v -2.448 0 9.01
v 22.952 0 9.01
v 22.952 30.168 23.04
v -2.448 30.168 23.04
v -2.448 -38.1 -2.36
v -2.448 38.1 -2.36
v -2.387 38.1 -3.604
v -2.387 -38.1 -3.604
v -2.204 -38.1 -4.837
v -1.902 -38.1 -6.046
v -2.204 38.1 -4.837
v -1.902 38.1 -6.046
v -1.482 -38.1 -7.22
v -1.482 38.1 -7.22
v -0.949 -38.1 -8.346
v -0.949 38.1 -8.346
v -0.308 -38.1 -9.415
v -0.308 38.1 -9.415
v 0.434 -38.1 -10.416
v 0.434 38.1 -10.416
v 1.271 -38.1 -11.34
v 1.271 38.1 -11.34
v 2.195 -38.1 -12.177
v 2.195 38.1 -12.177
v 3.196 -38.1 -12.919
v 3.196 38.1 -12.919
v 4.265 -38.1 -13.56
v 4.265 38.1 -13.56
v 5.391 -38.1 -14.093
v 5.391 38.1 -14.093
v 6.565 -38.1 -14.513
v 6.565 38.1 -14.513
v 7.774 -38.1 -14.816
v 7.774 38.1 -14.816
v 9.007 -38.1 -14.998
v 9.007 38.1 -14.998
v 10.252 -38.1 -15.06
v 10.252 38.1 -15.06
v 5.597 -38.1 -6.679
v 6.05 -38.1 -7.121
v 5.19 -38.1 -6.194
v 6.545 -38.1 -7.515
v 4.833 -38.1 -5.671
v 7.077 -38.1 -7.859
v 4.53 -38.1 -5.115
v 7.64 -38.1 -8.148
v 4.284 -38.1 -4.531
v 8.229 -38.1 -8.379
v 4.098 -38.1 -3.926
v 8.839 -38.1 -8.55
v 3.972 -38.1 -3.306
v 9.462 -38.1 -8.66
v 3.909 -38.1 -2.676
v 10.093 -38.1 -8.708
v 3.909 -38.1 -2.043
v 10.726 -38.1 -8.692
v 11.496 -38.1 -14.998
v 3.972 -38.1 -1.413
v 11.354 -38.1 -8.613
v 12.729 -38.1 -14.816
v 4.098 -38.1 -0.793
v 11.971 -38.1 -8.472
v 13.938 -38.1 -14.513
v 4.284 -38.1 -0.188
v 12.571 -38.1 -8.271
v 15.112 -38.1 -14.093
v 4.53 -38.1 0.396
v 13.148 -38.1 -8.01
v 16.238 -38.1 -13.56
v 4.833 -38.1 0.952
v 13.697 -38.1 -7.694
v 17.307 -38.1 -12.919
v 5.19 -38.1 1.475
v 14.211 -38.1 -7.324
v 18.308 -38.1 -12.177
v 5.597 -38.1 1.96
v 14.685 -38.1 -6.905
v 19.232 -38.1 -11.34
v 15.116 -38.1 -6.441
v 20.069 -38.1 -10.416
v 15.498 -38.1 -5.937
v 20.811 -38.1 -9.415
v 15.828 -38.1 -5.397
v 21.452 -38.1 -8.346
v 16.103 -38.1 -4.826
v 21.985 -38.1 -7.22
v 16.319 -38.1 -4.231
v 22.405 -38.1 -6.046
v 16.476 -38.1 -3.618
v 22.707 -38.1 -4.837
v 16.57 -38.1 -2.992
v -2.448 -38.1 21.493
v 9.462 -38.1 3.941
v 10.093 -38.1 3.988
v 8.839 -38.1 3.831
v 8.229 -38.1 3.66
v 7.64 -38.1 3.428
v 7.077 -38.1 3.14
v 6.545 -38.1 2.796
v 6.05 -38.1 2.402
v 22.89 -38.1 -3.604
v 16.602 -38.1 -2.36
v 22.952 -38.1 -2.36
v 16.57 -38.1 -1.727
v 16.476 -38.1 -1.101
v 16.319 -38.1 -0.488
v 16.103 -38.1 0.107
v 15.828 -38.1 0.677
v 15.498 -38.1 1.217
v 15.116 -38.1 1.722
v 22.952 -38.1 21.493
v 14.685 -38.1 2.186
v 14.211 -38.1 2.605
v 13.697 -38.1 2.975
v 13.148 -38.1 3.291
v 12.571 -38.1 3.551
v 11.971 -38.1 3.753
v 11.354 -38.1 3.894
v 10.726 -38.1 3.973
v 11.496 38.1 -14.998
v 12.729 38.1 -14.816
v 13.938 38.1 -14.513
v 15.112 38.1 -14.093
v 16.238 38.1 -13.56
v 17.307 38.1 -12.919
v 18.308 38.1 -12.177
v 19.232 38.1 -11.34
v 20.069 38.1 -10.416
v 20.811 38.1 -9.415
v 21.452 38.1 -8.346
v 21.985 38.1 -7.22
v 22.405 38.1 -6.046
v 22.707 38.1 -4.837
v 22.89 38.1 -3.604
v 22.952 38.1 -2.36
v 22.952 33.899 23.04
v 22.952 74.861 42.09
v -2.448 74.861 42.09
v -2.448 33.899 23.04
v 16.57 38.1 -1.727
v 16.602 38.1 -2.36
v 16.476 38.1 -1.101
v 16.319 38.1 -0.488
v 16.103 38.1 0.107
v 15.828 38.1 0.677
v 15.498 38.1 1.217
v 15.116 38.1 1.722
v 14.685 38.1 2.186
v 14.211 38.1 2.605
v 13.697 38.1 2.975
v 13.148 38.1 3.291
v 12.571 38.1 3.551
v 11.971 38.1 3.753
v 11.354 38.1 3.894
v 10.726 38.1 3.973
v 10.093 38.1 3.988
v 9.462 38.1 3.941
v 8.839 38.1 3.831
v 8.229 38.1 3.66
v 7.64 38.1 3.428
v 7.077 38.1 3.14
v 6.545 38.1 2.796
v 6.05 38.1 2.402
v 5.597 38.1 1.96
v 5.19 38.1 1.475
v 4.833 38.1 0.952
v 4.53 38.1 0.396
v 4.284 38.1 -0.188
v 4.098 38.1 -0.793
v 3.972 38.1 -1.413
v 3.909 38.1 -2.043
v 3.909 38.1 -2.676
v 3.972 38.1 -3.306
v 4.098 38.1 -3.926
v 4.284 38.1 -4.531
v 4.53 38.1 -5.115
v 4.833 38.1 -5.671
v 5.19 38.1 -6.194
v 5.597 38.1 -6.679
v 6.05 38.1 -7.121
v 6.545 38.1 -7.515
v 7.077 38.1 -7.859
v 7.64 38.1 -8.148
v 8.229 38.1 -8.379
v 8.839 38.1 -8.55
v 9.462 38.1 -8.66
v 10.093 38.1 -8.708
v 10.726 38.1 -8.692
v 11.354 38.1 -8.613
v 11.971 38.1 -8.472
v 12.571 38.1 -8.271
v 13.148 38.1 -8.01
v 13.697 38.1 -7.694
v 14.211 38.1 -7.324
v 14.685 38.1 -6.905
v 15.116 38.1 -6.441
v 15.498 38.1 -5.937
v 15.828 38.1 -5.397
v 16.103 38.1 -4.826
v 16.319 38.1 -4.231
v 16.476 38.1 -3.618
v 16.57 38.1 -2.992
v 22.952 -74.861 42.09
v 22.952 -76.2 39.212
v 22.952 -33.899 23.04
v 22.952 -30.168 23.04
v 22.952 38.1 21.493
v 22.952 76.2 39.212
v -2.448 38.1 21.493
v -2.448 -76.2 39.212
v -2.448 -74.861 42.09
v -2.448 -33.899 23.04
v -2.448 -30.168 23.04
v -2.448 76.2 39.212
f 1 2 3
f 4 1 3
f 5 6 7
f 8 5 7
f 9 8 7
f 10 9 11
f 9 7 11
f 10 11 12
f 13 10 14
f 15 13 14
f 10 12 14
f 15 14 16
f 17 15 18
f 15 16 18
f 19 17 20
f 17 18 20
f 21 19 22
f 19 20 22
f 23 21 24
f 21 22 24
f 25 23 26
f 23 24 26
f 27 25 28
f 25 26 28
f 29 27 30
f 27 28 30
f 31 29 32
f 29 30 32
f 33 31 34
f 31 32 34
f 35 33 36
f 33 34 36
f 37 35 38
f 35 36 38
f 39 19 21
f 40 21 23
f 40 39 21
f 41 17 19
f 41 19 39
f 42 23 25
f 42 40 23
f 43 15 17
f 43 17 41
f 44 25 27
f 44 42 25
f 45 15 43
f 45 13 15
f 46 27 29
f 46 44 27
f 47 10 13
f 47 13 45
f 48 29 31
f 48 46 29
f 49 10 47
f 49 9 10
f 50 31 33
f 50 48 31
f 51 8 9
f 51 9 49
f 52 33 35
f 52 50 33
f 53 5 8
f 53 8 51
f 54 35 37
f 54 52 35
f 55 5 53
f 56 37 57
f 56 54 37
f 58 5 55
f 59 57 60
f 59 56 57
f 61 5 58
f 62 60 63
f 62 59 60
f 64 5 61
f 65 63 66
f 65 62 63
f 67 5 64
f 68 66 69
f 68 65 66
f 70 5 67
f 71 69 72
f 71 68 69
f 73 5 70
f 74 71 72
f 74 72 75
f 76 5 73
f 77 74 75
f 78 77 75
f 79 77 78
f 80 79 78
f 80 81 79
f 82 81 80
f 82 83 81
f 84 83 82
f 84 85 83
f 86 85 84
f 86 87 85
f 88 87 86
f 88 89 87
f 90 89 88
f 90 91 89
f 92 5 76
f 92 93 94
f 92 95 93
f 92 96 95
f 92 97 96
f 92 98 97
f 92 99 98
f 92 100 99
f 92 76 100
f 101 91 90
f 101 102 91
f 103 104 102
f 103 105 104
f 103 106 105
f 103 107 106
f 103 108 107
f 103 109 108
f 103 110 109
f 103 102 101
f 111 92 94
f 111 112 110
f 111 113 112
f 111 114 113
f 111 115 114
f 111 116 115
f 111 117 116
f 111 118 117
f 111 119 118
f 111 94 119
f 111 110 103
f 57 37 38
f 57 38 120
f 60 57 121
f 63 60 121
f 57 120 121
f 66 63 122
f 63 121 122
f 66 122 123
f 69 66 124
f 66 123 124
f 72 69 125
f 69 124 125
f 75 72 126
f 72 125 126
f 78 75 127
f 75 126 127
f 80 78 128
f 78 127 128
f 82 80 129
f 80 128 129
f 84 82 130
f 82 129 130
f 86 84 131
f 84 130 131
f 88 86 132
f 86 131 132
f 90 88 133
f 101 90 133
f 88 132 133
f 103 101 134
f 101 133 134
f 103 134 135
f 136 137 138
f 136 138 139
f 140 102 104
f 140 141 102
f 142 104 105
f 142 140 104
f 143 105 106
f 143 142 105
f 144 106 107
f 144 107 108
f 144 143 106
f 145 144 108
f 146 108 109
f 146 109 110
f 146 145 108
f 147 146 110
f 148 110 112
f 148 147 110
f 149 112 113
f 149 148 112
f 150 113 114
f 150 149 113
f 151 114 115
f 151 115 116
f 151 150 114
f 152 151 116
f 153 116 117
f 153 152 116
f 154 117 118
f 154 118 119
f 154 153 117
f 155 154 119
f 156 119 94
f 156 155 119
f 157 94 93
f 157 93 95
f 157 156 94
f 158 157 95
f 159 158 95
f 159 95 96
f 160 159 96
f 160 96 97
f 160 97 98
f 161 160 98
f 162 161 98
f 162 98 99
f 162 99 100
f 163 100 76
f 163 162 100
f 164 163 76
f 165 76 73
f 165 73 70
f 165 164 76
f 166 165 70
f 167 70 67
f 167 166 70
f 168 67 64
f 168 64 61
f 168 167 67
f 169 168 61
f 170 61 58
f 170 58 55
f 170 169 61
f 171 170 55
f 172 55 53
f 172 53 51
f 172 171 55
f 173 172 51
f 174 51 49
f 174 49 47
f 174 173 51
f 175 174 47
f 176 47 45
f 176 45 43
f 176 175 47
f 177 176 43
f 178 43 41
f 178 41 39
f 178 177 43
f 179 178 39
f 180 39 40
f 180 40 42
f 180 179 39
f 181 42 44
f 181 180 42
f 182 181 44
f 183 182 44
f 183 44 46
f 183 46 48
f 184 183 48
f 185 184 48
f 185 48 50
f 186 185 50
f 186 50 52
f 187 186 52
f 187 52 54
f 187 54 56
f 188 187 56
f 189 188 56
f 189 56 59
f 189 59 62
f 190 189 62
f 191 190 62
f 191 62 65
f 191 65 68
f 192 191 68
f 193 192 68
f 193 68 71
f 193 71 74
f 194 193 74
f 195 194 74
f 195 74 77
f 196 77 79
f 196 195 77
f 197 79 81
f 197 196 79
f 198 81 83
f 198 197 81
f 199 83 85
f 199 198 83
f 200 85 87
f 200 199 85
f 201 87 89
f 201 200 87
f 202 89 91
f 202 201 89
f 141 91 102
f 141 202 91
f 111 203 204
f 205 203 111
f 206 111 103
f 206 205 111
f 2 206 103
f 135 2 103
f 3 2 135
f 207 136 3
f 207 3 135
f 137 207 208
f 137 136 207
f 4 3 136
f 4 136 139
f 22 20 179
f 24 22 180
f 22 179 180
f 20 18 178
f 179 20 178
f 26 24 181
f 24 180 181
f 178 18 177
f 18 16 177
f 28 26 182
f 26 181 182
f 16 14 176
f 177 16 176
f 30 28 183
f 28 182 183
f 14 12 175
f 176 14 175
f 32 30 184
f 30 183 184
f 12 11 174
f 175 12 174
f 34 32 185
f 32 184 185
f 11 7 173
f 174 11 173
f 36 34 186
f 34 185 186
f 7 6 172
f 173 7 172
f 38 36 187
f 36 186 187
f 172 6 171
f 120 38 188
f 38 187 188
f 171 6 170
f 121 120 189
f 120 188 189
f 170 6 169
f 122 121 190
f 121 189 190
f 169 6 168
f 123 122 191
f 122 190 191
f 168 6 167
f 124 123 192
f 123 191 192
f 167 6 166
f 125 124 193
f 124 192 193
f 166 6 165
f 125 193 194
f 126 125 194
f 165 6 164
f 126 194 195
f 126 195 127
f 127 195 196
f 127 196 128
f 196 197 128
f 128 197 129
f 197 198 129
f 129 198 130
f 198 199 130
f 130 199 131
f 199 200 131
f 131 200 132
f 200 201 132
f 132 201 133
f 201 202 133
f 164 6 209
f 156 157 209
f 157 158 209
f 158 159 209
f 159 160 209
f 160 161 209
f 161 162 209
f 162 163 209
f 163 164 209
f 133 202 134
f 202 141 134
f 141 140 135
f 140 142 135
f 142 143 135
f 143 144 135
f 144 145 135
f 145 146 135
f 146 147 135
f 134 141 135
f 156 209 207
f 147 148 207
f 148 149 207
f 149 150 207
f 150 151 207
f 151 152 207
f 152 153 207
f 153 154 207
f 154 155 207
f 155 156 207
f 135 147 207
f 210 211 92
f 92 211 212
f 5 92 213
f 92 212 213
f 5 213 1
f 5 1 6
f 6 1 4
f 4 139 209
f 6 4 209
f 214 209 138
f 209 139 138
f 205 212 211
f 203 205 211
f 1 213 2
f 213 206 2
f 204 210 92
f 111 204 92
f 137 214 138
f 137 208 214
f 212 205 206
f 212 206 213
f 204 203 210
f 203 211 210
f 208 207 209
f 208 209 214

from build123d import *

# Parameters (mm, degrees)
F0_R          = 6.35
F1_DEPTH      = 38.1
F3_DEPTH      = 22.9515263319
F3_DEPTH_BACK = 2.4484736681
F5_DEPTH      = 127


with BuildPart() as f1:
    # F0 (on Front) → F1 (new body, symmetric)
    with BuildSketch(Plane.XZ):
        with BuildLine():
            Line((22.9515263319, 23.0404102315), (-2.4484736681, 23.0404102315))
            Line((-2.4484736681, 23.0404102315), (-2.4484736681, -2.3595897685))
            ThreePointArc((-2.4484736681, -2.3595897685), (1.2712702108, -11.3398458895), (10.2515263319, -15.0595897685))
            ThreePointArc((10.2515263319, -15.0595897685), (19.231782453, -11.3398458895), (22.9515263319, -2.3595897685))
            Line((22.9515263319, -2.3595897685), (22.9515263319, 23.0404102315))
        make_face()
        with Locations((10.2515263319, -2.3595897685)):
            Circle(F0_R, mode=Mode.SUBTRACT)
    extrude(amount=F1_DEPTH, both=True)

    # F2 (on Right) → F3 (join, two sides)
    with BuildSketch(Plane.YZ) as f3_sk:
        Polygon((74.8611375716, 42.0904102315), (28.7987175975, 20.6686113778), (30.1375800259, 17.7897101294), (76.2, 39.2115089832), align=None)
        Polygon((-28.7987175975, 20.6686113778), (-74.8611375716, 42.0904102315), (-76.2, 39.2115089832), (-30.1375800259, 17.7897101294), align=None)
    extrude(amount=F3_DEPTH)
    extrude(f3_sk.sketch, amount=-F3_DEPTH_BACK)

    # F4 (on Right) → F5 (cut, symmetric)
    with BuildSketch(Plane.YZ):
        Polygon((0, 9.0103000402), (37.7937594108, 26.5866738495), (-37.5799492613, 26.4872392558), align=None)
    extrude(amount=F5_DEPTH, both=True, mode=Mode.SUBTRACT)


solid = f1.part
